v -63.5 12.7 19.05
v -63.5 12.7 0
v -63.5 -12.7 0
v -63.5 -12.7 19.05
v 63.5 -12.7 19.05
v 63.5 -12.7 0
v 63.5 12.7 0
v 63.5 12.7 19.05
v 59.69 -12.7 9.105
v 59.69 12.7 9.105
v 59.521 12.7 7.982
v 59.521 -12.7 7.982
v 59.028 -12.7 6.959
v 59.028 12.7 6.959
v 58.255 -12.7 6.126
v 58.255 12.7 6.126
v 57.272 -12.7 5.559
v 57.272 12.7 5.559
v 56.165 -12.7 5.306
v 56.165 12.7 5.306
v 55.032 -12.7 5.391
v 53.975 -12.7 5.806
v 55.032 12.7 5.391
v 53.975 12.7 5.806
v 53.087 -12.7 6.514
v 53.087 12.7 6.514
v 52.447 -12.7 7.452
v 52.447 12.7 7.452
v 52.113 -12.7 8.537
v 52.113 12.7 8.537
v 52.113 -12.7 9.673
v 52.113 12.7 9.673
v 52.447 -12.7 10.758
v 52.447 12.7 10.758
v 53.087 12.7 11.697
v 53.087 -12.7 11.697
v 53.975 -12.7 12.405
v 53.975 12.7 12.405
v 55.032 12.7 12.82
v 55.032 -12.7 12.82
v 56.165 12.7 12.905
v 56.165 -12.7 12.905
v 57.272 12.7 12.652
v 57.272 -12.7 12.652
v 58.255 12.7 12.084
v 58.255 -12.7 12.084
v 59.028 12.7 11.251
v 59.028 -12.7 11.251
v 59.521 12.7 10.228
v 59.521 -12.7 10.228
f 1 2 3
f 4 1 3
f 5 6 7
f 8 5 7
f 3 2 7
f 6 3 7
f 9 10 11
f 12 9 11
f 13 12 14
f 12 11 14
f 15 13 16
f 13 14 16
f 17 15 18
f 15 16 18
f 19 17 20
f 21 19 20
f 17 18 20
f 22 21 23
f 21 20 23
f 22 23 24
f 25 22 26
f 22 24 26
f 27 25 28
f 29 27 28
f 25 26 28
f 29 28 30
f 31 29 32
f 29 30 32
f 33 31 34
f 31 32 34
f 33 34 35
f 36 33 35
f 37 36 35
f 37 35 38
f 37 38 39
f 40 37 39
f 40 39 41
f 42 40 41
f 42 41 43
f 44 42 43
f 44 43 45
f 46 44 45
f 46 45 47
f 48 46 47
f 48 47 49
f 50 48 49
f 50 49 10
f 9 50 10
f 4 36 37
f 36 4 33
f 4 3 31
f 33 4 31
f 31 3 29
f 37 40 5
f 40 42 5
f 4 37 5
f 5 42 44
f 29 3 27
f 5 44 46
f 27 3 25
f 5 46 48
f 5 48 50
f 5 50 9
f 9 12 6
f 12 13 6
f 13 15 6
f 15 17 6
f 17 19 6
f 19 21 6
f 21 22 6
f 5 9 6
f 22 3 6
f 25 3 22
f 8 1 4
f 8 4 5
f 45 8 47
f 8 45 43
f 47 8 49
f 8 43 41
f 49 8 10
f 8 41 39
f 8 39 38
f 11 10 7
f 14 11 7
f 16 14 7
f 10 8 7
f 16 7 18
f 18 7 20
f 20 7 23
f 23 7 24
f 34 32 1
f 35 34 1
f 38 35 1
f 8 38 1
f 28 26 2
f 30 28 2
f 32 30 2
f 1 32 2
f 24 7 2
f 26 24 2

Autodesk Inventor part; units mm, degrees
ref_plane "YZ Plane" through (0, 0, 0) normal (1, 0, 0) x (0, 1, 0)
ref_plane "XZ Plane" through (0, 0, 0) normal (0, 1, 0) x (-1, 0, 0)
ref_plane "XY Plane" through (0, 0, 0) normal (0, 0, 1) x (1, 0, 0)
sketch "Sketch1" plane through (0, 0, 0) normal (0, 0, 1) x (1, 0, 0)
  line L0 (-63.5, -12.7) -> (63.5, -12.7)
  line L1 (63.5, -12.7) -> (63.5, 12.7)
  line L2 (63.5, 12.7) -> (-63.5, 12.7)
  line L3 (-63.5, 12.7) -> (-63.5, -12.7)
  line L4 (-63.5, -12.7) -> (63.5, 12.7) construction
  line L5 (63.5, -12.7) -> (-63.5, 12.7) construction
  point P0 (0, 0)
  dimension "d0" = 127
  dimension "d1" = 25.4
extrude "Extrusion1" add sketch "Sketch1" along normal blind 19.05
sketch "Sketch3" plane through (-63.5, 12.7, 0) normal (0, 1, 0) x (1, 0, 0)
  circle A0 centre (119.38, -9.1052) radius 3.81
  line L0 (0, 0) -> (0, -19.05) projected
  line L1 (127, 0) -> (127, -19.05) projected
  point P0 (63.5, 0)
  dimension "d12" = 7.62
  dimension "d14" = 7.62
extrude "Extrusion3" cut sketch "Sketch3" against normal blind 25.4
properties part number "Side Bar"
